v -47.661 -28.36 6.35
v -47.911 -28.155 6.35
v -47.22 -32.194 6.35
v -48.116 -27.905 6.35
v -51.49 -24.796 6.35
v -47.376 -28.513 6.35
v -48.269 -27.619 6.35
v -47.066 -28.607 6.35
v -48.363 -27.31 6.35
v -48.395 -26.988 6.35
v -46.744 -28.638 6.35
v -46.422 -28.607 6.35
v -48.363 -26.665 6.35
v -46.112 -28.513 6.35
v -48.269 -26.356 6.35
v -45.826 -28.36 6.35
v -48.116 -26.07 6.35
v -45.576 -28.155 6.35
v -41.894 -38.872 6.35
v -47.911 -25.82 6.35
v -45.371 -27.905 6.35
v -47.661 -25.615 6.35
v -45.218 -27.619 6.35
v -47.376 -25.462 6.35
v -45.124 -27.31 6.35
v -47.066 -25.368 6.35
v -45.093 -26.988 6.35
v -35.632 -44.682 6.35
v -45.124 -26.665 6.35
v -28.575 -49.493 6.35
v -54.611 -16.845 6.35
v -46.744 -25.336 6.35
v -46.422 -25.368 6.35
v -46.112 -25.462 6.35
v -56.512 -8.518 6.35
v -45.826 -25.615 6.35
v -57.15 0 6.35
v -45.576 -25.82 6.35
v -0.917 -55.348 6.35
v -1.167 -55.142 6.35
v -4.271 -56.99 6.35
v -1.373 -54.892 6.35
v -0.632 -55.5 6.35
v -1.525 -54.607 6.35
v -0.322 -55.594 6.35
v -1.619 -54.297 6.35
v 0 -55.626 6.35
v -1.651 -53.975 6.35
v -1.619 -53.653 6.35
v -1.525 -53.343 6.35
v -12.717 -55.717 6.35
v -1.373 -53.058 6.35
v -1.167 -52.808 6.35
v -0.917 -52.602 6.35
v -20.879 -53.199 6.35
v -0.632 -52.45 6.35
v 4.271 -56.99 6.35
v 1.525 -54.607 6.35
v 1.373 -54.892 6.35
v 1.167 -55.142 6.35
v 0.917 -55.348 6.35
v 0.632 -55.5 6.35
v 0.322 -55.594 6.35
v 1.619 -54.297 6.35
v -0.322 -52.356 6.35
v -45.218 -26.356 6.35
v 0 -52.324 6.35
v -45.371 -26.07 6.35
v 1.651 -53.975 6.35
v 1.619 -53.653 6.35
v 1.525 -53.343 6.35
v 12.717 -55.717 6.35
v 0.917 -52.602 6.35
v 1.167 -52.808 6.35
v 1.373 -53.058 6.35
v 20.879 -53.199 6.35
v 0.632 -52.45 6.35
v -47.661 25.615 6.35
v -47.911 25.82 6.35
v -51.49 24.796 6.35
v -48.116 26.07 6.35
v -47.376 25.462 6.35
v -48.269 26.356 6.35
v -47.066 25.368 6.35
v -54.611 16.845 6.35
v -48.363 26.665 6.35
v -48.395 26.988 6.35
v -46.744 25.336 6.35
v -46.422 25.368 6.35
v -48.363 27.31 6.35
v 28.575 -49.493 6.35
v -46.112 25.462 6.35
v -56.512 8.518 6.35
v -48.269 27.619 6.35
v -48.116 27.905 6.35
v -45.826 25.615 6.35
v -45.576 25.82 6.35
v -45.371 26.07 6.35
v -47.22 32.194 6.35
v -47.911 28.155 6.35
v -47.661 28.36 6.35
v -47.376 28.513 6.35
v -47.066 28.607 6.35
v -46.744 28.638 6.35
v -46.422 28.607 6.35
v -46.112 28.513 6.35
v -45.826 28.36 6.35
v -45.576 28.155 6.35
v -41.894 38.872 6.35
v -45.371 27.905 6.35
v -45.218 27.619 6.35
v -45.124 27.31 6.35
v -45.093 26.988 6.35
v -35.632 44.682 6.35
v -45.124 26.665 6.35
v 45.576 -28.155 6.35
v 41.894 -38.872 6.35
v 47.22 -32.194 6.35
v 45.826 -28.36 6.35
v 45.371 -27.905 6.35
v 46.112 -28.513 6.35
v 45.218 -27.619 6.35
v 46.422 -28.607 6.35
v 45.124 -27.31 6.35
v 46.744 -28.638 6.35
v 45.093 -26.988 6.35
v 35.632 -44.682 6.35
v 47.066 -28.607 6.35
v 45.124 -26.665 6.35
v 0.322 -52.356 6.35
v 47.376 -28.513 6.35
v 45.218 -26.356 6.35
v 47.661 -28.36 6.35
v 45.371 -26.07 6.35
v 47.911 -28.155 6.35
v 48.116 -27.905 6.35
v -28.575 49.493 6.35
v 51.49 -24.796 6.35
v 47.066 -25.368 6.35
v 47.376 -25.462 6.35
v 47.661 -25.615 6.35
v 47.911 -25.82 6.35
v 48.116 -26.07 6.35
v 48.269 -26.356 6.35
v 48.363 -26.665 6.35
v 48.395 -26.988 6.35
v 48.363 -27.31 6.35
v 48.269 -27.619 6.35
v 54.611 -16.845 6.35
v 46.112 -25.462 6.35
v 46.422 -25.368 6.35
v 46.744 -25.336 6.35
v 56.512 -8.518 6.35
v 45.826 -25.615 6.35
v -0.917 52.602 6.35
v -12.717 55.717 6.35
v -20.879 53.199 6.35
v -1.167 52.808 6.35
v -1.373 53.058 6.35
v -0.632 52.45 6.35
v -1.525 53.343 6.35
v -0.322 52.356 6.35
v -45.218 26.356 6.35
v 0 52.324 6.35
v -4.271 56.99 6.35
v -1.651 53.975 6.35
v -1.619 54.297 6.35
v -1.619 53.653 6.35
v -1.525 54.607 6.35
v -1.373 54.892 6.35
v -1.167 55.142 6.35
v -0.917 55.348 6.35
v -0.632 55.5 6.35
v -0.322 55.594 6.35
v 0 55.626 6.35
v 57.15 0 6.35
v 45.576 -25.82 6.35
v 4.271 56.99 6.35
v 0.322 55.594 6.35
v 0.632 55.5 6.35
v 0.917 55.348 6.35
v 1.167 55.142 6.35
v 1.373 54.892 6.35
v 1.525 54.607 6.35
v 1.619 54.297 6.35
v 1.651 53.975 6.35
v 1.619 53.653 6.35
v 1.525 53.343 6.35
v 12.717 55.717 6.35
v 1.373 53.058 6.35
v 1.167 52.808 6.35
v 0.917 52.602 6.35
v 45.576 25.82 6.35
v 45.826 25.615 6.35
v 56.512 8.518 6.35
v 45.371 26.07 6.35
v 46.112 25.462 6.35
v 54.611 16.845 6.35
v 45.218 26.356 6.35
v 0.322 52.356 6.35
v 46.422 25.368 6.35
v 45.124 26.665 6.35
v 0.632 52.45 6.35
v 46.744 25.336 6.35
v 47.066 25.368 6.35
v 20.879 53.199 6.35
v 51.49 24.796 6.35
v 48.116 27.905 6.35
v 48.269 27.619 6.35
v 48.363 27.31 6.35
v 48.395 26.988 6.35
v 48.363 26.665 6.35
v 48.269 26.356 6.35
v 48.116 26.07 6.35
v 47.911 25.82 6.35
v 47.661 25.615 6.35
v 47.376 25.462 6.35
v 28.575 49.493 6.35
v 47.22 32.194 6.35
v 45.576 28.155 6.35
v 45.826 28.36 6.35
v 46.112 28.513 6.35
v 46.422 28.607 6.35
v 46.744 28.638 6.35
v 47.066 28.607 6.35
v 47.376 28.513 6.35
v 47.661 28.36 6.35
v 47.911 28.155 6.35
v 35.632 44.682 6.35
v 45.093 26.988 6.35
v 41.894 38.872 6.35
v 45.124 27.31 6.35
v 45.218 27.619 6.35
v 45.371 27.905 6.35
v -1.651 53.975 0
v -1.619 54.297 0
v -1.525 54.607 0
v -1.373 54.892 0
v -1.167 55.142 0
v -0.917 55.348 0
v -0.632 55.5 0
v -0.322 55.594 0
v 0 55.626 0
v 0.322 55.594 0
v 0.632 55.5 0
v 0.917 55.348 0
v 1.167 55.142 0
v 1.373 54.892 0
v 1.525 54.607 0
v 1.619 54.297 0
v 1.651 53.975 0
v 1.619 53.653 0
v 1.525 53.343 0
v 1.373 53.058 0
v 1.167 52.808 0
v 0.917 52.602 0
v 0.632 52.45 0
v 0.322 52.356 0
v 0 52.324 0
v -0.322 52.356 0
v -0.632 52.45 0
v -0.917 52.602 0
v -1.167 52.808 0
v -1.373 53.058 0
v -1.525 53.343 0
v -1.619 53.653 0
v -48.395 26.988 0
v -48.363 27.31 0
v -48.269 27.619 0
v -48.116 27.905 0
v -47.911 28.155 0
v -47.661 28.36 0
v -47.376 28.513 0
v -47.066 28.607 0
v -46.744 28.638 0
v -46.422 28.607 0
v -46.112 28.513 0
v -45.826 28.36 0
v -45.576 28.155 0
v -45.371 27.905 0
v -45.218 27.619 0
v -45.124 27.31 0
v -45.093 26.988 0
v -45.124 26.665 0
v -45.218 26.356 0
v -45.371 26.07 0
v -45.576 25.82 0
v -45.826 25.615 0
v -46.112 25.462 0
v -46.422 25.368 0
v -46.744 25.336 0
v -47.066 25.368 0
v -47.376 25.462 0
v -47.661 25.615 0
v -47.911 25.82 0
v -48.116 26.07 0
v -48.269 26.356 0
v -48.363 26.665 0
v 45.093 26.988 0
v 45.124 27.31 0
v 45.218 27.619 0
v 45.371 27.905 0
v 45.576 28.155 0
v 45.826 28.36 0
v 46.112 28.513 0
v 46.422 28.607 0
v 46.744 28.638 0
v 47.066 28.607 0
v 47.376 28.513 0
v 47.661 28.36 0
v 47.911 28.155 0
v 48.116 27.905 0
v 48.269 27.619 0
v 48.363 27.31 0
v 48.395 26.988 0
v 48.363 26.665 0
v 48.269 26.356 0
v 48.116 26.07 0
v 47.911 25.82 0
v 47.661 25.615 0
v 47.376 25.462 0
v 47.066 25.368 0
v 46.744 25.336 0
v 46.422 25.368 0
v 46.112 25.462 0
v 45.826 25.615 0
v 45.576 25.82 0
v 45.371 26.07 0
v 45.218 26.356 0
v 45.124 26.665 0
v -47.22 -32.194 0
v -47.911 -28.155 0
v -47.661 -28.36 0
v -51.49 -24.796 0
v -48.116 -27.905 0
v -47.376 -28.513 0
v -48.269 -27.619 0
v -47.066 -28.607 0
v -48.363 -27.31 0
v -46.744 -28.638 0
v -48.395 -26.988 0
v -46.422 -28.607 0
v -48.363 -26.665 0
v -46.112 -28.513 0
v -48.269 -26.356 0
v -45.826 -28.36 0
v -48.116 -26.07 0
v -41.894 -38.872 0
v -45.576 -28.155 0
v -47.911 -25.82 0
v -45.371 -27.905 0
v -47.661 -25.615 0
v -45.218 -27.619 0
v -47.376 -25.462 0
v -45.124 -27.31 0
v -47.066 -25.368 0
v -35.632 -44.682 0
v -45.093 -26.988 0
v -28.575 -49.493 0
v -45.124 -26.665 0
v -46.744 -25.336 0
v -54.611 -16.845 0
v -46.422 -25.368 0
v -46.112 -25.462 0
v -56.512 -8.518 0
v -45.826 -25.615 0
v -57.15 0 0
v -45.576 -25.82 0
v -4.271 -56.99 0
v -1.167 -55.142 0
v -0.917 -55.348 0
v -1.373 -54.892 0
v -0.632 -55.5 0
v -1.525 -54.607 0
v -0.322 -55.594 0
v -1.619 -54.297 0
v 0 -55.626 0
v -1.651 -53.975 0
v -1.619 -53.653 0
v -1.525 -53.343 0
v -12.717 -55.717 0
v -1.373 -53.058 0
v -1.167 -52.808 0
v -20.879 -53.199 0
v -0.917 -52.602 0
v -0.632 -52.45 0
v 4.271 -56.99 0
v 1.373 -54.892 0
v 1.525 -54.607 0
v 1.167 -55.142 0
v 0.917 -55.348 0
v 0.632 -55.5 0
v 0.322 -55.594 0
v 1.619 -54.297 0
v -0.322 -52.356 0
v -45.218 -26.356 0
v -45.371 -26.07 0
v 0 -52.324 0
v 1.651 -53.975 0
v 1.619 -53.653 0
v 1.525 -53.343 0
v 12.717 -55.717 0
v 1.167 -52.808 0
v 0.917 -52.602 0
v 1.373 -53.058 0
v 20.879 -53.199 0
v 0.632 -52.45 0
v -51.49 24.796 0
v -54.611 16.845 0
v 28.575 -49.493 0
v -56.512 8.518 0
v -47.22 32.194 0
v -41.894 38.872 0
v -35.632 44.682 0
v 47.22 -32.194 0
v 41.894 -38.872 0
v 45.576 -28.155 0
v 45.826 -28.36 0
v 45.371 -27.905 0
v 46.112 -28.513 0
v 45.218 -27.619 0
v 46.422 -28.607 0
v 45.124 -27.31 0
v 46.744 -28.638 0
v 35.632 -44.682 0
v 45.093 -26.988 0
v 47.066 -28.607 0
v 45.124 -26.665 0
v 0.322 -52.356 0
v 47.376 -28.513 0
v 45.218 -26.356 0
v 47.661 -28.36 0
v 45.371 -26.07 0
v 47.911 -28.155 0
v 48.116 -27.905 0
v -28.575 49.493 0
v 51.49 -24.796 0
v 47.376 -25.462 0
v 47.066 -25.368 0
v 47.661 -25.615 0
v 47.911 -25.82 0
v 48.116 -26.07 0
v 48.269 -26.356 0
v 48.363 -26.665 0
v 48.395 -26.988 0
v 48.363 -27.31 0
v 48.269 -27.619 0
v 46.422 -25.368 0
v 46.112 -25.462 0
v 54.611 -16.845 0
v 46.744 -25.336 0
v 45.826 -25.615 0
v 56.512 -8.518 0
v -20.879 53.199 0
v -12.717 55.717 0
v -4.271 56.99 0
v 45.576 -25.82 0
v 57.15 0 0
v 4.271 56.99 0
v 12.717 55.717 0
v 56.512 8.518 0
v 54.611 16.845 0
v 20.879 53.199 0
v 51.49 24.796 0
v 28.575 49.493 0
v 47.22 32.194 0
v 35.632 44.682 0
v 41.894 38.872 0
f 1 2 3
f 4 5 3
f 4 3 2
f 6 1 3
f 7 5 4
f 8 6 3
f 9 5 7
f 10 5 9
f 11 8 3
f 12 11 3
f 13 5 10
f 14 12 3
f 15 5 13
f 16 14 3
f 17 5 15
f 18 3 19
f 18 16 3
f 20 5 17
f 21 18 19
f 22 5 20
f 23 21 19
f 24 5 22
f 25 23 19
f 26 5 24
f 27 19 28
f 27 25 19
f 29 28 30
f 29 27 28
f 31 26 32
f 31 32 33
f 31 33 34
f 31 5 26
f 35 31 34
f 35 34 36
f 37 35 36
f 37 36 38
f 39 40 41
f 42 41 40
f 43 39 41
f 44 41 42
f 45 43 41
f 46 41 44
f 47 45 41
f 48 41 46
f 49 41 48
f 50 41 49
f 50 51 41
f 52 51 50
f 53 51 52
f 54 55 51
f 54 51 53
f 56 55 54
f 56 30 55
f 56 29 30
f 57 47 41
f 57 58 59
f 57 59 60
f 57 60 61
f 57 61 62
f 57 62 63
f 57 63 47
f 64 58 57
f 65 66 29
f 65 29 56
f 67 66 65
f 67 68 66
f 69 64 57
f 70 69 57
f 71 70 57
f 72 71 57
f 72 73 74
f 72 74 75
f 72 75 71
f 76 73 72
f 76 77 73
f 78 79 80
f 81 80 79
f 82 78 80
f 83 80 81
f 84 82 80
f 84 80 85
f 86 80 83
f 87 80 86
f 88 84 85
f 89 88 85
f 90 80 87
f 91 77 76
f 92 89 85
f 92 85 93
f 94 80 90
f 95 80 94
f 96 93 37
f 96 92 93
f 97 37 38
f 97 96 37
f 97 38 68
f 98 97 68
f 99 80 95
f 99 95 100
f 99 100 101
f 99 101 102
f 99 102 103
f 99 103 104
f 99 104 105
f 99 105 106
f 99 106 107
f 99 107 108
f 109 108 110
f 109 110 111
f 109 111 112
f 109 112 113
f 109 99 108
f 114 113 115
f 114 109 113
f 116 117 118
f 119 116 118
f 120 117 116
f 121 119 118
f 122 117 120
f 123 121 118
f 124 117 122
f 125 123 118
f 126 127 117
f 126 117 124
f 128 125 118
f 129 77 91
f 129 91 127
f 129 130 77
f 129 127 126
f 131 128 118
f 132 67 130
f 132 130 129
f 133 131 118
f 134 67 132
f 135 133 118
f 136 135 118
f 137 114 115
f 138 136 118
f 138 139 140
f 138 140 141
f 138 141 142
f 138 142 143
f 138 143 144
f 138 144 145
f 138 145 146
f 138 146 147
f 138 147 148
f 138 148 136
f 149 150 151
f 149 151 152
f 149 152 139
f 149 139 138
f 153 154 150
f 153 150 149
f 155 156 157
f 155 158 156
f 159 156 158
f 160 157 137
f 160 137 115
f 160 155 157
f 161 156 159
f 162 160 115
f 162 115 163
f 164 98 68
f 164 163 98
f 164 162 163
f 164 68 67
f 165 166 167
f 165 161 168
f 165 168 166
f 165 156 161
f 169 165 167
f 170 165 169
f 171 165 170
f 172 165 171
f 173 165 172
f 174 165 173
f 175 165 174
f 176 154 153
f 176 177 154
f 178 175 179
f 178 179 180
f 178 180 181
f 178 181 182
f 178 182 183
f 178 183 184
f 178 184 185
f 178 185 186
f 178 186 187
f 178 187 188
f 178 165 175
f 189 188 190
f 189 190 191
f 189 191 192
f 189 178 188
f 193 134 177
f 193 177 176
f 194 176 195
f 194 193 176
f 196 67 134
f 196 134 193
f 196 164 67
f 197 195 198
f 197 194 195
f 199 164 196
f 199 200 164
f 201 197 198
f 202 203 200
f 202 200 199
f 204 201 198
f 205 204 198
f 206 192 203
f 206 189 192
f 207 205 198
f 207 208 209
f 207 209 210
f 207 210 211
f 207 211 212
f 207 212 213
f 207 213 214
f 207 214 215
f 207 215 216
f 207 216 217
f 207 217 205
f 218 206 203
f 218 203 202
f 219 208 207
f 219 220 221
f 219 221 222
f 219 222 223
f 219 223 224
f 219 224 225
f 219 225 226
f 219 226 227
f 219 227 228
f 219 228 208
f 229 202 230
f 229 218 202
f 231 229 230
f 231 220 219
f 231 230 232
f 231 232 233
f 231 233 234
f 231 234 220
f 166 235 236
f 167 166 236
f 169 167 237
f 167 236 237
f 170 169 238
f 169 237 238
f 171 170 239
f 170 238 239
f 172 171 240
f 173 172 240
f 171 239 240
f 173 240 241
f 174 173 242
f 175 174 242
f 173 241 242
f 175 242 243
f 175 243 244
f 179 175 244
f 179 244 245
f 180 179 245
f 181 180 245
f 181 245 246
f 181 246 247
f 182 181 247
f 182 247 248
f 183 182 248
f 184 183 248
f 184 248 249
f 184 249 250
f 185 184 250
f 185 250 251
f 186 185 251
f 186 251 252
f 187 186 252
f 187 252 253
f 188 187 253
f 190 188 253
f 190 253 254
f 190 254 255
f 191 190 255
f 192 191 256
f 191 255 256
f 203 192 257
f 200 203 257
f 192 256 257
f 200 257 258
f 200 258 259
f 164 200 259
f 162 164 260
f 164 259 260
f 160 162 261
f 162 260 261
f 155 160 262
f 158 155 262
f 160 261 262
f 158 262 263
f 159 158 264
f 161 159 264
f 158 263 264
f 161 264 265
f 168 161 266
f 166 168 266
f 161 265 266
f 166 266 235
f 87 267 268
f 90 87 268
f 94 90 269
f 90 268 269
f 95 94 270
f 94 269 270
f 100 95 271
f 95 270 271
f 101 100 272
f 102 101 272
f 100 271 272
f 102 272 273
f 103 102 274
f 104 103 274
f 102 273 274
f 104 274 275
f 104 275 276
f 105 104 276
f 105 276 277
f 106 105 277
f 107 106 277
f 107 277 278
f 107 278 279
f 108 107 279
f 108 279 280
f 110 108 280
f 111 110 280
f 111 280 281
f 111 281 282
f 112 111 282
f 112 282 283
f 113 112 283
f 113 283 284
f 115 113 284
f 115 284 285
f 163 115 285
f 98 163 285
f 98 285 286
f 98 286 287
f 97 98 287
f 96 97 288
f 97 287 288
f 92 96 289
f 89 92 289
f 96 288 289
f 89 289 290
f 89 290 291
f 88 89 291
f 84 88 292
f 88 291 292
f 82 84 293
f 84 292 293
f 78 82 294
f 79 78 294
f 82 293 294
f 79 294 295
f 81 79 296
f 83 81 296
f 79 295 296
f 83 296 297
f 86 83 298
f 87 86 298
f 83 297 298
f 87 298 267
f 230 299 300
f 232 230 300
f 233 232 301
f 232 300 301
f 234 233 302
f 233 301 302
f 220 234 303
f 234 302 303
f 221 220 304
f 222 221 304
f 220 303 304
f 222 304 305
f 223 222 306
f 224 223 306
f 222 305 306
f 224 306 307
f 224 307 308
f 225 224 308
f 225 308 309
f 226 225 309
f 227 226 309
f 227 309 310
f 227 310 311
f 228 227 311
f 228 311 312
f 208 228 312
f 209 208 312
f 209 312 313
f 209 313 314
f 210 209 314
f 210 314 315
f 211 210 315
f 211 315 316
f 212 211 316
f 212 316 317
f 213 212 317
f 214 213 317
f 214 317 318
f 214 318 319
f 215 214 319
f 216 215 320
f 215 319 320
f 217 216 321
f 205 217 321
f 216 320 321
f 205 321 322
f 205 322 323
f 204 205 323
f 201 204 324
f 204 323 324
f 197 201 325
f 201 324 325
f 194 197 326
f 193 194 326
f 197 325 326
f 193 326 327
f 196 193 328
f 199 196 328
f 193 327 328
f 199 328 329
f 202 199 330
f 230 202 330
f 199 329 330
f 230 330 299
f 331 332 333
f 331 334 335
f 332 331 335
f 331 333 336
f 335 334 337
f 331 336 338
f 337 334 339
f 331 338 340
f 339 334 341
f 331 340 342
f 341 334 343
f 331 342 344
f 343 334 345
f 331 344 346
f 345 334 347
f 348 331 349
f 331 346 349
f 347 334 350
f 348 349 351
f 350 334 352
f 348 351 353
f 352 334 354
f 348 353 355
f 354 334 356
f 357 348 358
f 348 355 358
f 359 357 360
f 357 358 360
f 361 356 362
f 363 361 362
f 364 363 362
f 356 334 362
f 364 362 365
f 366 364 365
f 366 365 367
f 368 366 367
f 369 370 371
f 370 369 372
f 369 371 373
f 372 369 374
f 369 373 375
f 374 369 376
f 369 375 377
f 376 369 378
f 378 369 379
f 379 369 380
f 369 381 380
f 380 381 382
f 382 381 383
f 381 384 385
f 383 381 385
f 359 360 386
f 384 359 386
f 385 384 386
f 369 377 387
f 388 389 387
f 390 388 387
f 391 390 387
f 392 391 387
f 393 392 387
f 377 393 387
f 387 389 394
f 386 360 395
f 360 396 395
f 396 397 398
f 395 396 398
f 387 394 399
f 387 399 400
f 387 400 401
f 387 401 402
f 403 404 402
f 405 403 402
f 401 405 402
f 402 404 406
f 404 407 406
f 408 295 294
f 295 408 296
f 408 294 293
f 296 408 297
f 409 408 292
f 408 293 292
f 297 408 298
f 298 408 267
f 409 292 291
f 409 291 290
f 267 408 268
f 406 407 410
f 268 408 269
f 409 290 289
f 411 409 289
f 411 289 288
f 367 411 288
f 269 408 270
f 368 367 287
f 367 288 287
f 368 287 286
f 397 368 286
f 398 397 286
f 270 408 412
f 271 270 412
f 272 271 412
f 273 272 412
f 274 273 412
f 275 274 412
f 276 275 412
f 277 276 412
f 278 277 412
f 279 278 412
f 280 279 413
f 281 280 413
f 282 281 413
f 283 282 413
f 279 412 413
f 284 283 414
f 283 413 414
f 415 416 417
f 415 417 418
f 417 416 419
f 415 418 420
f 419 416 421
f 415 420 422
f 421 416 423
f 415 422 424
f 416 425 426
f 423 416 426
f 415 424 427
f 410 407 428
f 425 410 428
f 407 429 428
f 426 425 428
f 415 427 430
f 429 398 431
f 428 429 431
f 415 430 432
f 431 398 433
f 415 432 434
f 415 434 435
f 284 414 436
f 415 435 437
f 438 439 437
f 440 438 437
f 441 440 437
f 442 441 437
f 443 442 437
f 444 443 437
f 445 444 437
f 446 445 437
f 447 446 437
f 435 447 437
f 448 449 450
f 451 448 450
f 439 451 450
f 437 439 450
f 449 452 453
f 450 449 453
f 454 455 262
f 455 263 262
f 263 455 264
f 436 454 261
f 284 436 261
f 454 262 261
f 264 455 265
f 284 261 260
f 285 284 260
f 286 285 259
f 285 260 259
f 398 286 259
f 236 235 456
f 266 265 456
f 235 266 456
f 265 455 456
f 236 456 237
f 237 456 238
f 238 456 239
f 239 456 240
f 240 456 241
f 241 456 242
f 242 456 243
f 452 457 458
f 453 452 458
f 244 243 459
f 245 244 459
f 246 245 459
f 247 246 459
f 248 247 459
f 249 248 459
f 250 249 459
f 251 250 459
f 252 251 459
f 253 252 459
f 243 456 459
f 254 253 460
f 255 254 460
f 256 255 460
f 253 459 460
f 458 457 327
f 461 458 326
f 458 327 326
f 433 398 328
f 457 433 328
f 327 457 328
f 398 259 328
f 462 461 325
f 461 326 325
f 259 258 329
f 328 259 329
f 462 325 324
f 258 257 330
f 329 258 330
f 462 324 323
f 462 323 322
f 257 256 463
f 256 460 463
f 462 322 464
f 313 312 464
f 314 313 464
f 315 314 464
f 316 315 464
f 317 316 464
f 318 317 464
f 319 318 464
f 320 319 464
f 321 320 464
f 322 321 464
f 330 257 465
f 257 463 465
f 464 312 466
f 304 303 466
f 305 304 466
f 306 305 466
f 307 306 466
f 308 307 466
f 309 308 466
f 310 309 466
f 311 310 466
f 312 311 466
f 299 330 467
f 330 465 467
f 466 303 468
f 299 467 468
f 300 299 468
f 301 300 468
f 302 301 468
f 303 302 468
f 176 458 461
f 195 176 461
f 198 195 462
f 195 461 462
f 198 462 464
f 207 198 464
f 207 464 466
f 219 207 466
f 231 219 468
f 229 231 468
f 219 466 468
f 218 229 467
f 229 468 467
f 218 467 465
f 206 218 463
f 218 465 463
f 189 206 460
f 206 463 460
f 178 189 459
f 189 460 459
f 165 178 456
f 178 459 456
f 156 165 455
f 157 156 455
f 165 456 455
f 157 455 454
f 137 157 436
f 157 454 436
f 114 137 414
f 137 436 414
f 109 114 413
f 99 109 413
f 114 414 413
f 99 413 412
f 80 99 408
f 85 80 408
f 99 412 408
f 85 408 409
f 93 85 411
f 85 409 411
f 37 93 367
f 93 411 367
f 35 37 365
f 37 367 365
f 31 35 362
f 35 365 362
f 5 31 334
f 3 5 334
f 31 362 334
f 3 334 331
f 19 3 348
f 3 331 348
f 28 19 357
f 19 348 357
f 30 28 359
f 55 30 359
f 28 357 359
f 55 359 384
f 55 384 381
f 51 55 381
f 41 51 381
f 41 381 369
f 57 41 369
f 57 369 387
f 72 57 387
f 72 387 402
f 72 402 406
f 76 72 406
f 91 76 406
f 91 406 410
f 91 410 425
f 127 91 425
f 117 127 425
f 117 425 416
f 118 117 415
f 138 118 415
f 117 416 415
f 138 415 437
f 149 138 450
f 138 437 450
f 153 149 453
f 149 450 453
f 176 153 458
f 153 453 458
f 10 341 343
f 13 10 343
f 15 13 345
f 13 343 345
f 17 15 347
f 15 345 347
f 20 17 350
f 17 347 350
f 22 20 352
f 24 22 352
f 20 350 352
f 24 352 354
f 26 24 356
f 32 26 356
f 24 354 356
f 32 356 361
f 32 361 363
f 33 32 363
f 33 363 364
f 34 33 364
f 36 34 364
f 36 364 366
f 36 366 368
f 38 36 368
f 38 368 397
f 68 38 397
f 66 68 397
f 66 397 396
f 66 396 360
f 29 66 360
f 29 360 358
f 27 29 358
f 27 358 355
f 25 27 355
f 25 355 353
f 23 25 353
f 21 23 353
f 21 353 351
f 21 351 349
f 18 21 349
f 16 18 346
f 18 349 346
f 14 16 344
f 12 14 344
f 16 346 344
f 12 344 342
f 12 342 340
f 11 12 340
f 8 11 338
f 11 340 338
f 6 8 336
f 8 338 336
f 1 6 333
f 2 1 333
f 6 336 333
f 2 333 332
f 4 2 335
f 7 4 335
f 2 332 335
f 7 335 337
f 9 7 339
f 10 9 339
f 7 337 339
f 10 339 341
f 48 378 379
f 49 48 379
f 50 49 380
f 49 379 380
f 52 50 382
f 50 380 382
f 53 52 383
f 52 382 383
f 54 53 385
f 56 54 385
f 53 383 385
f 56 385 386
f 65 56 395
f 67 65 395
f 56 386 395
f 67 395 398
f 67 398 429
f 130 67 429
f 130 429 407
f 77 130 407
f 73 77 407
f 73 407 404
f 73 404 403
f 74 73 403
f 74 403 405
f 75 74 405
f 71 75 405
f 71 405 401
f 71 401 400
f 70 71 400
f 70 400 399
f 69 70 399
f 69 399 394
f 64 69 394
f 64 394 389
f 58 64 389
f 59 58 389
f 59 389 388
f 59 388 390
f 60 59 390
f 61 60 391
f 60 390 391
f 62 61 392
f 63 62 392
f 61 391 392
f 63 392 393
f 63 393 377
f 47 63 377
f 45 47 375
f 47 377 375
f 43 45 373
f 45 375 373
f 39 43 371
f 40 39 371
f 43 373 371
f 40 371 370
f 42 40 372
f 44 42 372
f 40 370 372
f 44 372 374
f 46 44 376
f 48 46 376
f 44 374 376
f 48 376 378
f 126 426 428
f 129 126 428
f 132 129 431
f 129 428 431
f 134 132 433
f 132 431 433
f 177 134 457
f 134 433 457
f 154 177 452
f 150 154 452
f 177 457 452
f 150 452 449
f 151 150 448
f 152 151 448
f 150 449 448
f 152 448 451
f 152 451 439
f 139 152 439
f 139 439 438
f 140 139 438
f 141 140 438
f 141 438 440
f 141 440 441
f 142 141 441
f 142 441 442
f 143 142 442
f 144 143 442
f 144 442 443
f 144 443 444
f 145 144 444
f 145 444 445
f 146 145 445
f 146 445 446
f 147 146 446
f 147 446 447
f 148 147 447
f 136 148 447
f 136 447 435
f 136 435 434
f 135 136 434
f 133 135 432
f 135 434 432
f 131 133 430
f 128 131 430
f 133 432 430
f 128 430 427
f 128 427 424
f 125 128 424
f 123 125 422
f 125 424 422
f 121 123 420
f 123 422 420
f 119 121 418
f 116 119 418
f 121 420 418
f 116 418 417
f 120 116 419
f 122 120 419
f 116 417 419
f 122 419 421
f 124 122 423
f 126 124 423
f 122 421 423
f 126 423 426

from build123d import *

# Parameters (mm, degrees)
SKETCH_1_R          = 57.15
EXTRUDE_1_DEPTH     = 6.35
SKETCH_2_R          = 1.651
CUT_EXTRUDE_1_DEPTH = 82.071372876


with BuildPart() as part:
    # 草图1 → 凸台-拉伸1 (new body)
    with BuildSketch(Plane.XY):
        Circle(SKETCH_1_R)
    extrude(amount=EXTRUDE_1_DEPTH)

    # 草图2 → 切除-拉伸1 (cut, through all)
    with BuildSketch(Plane(origin=(0, 0, 0), x_dir=(-1, 0, 0), z_dir=(0, 0, -1))):
        with Locations((-46.743721169, 26.9875)):
            Circle(SKETCH_2_R)
        with Locations((0, 53.975)):
            Circle(SKETCH_2_R)
        with Locations((46.743721169, 26.9875)):
            Circle(SKETCH_2_R)
        with Locations((46.743721169, -26.9875)):
            Circle(SKETCH_2_R)
        with Locations((0, -53.975)):
            Circle(SKETCH_2_R)
        with Locations((-46.743721169, -26.9875)):
            Circle(SKETCH_2_R)
    extrude(amount=-CUT_EXTRUDE_1_DEPTH, mode=Mode.SUBTRACT)


solid = part.part
